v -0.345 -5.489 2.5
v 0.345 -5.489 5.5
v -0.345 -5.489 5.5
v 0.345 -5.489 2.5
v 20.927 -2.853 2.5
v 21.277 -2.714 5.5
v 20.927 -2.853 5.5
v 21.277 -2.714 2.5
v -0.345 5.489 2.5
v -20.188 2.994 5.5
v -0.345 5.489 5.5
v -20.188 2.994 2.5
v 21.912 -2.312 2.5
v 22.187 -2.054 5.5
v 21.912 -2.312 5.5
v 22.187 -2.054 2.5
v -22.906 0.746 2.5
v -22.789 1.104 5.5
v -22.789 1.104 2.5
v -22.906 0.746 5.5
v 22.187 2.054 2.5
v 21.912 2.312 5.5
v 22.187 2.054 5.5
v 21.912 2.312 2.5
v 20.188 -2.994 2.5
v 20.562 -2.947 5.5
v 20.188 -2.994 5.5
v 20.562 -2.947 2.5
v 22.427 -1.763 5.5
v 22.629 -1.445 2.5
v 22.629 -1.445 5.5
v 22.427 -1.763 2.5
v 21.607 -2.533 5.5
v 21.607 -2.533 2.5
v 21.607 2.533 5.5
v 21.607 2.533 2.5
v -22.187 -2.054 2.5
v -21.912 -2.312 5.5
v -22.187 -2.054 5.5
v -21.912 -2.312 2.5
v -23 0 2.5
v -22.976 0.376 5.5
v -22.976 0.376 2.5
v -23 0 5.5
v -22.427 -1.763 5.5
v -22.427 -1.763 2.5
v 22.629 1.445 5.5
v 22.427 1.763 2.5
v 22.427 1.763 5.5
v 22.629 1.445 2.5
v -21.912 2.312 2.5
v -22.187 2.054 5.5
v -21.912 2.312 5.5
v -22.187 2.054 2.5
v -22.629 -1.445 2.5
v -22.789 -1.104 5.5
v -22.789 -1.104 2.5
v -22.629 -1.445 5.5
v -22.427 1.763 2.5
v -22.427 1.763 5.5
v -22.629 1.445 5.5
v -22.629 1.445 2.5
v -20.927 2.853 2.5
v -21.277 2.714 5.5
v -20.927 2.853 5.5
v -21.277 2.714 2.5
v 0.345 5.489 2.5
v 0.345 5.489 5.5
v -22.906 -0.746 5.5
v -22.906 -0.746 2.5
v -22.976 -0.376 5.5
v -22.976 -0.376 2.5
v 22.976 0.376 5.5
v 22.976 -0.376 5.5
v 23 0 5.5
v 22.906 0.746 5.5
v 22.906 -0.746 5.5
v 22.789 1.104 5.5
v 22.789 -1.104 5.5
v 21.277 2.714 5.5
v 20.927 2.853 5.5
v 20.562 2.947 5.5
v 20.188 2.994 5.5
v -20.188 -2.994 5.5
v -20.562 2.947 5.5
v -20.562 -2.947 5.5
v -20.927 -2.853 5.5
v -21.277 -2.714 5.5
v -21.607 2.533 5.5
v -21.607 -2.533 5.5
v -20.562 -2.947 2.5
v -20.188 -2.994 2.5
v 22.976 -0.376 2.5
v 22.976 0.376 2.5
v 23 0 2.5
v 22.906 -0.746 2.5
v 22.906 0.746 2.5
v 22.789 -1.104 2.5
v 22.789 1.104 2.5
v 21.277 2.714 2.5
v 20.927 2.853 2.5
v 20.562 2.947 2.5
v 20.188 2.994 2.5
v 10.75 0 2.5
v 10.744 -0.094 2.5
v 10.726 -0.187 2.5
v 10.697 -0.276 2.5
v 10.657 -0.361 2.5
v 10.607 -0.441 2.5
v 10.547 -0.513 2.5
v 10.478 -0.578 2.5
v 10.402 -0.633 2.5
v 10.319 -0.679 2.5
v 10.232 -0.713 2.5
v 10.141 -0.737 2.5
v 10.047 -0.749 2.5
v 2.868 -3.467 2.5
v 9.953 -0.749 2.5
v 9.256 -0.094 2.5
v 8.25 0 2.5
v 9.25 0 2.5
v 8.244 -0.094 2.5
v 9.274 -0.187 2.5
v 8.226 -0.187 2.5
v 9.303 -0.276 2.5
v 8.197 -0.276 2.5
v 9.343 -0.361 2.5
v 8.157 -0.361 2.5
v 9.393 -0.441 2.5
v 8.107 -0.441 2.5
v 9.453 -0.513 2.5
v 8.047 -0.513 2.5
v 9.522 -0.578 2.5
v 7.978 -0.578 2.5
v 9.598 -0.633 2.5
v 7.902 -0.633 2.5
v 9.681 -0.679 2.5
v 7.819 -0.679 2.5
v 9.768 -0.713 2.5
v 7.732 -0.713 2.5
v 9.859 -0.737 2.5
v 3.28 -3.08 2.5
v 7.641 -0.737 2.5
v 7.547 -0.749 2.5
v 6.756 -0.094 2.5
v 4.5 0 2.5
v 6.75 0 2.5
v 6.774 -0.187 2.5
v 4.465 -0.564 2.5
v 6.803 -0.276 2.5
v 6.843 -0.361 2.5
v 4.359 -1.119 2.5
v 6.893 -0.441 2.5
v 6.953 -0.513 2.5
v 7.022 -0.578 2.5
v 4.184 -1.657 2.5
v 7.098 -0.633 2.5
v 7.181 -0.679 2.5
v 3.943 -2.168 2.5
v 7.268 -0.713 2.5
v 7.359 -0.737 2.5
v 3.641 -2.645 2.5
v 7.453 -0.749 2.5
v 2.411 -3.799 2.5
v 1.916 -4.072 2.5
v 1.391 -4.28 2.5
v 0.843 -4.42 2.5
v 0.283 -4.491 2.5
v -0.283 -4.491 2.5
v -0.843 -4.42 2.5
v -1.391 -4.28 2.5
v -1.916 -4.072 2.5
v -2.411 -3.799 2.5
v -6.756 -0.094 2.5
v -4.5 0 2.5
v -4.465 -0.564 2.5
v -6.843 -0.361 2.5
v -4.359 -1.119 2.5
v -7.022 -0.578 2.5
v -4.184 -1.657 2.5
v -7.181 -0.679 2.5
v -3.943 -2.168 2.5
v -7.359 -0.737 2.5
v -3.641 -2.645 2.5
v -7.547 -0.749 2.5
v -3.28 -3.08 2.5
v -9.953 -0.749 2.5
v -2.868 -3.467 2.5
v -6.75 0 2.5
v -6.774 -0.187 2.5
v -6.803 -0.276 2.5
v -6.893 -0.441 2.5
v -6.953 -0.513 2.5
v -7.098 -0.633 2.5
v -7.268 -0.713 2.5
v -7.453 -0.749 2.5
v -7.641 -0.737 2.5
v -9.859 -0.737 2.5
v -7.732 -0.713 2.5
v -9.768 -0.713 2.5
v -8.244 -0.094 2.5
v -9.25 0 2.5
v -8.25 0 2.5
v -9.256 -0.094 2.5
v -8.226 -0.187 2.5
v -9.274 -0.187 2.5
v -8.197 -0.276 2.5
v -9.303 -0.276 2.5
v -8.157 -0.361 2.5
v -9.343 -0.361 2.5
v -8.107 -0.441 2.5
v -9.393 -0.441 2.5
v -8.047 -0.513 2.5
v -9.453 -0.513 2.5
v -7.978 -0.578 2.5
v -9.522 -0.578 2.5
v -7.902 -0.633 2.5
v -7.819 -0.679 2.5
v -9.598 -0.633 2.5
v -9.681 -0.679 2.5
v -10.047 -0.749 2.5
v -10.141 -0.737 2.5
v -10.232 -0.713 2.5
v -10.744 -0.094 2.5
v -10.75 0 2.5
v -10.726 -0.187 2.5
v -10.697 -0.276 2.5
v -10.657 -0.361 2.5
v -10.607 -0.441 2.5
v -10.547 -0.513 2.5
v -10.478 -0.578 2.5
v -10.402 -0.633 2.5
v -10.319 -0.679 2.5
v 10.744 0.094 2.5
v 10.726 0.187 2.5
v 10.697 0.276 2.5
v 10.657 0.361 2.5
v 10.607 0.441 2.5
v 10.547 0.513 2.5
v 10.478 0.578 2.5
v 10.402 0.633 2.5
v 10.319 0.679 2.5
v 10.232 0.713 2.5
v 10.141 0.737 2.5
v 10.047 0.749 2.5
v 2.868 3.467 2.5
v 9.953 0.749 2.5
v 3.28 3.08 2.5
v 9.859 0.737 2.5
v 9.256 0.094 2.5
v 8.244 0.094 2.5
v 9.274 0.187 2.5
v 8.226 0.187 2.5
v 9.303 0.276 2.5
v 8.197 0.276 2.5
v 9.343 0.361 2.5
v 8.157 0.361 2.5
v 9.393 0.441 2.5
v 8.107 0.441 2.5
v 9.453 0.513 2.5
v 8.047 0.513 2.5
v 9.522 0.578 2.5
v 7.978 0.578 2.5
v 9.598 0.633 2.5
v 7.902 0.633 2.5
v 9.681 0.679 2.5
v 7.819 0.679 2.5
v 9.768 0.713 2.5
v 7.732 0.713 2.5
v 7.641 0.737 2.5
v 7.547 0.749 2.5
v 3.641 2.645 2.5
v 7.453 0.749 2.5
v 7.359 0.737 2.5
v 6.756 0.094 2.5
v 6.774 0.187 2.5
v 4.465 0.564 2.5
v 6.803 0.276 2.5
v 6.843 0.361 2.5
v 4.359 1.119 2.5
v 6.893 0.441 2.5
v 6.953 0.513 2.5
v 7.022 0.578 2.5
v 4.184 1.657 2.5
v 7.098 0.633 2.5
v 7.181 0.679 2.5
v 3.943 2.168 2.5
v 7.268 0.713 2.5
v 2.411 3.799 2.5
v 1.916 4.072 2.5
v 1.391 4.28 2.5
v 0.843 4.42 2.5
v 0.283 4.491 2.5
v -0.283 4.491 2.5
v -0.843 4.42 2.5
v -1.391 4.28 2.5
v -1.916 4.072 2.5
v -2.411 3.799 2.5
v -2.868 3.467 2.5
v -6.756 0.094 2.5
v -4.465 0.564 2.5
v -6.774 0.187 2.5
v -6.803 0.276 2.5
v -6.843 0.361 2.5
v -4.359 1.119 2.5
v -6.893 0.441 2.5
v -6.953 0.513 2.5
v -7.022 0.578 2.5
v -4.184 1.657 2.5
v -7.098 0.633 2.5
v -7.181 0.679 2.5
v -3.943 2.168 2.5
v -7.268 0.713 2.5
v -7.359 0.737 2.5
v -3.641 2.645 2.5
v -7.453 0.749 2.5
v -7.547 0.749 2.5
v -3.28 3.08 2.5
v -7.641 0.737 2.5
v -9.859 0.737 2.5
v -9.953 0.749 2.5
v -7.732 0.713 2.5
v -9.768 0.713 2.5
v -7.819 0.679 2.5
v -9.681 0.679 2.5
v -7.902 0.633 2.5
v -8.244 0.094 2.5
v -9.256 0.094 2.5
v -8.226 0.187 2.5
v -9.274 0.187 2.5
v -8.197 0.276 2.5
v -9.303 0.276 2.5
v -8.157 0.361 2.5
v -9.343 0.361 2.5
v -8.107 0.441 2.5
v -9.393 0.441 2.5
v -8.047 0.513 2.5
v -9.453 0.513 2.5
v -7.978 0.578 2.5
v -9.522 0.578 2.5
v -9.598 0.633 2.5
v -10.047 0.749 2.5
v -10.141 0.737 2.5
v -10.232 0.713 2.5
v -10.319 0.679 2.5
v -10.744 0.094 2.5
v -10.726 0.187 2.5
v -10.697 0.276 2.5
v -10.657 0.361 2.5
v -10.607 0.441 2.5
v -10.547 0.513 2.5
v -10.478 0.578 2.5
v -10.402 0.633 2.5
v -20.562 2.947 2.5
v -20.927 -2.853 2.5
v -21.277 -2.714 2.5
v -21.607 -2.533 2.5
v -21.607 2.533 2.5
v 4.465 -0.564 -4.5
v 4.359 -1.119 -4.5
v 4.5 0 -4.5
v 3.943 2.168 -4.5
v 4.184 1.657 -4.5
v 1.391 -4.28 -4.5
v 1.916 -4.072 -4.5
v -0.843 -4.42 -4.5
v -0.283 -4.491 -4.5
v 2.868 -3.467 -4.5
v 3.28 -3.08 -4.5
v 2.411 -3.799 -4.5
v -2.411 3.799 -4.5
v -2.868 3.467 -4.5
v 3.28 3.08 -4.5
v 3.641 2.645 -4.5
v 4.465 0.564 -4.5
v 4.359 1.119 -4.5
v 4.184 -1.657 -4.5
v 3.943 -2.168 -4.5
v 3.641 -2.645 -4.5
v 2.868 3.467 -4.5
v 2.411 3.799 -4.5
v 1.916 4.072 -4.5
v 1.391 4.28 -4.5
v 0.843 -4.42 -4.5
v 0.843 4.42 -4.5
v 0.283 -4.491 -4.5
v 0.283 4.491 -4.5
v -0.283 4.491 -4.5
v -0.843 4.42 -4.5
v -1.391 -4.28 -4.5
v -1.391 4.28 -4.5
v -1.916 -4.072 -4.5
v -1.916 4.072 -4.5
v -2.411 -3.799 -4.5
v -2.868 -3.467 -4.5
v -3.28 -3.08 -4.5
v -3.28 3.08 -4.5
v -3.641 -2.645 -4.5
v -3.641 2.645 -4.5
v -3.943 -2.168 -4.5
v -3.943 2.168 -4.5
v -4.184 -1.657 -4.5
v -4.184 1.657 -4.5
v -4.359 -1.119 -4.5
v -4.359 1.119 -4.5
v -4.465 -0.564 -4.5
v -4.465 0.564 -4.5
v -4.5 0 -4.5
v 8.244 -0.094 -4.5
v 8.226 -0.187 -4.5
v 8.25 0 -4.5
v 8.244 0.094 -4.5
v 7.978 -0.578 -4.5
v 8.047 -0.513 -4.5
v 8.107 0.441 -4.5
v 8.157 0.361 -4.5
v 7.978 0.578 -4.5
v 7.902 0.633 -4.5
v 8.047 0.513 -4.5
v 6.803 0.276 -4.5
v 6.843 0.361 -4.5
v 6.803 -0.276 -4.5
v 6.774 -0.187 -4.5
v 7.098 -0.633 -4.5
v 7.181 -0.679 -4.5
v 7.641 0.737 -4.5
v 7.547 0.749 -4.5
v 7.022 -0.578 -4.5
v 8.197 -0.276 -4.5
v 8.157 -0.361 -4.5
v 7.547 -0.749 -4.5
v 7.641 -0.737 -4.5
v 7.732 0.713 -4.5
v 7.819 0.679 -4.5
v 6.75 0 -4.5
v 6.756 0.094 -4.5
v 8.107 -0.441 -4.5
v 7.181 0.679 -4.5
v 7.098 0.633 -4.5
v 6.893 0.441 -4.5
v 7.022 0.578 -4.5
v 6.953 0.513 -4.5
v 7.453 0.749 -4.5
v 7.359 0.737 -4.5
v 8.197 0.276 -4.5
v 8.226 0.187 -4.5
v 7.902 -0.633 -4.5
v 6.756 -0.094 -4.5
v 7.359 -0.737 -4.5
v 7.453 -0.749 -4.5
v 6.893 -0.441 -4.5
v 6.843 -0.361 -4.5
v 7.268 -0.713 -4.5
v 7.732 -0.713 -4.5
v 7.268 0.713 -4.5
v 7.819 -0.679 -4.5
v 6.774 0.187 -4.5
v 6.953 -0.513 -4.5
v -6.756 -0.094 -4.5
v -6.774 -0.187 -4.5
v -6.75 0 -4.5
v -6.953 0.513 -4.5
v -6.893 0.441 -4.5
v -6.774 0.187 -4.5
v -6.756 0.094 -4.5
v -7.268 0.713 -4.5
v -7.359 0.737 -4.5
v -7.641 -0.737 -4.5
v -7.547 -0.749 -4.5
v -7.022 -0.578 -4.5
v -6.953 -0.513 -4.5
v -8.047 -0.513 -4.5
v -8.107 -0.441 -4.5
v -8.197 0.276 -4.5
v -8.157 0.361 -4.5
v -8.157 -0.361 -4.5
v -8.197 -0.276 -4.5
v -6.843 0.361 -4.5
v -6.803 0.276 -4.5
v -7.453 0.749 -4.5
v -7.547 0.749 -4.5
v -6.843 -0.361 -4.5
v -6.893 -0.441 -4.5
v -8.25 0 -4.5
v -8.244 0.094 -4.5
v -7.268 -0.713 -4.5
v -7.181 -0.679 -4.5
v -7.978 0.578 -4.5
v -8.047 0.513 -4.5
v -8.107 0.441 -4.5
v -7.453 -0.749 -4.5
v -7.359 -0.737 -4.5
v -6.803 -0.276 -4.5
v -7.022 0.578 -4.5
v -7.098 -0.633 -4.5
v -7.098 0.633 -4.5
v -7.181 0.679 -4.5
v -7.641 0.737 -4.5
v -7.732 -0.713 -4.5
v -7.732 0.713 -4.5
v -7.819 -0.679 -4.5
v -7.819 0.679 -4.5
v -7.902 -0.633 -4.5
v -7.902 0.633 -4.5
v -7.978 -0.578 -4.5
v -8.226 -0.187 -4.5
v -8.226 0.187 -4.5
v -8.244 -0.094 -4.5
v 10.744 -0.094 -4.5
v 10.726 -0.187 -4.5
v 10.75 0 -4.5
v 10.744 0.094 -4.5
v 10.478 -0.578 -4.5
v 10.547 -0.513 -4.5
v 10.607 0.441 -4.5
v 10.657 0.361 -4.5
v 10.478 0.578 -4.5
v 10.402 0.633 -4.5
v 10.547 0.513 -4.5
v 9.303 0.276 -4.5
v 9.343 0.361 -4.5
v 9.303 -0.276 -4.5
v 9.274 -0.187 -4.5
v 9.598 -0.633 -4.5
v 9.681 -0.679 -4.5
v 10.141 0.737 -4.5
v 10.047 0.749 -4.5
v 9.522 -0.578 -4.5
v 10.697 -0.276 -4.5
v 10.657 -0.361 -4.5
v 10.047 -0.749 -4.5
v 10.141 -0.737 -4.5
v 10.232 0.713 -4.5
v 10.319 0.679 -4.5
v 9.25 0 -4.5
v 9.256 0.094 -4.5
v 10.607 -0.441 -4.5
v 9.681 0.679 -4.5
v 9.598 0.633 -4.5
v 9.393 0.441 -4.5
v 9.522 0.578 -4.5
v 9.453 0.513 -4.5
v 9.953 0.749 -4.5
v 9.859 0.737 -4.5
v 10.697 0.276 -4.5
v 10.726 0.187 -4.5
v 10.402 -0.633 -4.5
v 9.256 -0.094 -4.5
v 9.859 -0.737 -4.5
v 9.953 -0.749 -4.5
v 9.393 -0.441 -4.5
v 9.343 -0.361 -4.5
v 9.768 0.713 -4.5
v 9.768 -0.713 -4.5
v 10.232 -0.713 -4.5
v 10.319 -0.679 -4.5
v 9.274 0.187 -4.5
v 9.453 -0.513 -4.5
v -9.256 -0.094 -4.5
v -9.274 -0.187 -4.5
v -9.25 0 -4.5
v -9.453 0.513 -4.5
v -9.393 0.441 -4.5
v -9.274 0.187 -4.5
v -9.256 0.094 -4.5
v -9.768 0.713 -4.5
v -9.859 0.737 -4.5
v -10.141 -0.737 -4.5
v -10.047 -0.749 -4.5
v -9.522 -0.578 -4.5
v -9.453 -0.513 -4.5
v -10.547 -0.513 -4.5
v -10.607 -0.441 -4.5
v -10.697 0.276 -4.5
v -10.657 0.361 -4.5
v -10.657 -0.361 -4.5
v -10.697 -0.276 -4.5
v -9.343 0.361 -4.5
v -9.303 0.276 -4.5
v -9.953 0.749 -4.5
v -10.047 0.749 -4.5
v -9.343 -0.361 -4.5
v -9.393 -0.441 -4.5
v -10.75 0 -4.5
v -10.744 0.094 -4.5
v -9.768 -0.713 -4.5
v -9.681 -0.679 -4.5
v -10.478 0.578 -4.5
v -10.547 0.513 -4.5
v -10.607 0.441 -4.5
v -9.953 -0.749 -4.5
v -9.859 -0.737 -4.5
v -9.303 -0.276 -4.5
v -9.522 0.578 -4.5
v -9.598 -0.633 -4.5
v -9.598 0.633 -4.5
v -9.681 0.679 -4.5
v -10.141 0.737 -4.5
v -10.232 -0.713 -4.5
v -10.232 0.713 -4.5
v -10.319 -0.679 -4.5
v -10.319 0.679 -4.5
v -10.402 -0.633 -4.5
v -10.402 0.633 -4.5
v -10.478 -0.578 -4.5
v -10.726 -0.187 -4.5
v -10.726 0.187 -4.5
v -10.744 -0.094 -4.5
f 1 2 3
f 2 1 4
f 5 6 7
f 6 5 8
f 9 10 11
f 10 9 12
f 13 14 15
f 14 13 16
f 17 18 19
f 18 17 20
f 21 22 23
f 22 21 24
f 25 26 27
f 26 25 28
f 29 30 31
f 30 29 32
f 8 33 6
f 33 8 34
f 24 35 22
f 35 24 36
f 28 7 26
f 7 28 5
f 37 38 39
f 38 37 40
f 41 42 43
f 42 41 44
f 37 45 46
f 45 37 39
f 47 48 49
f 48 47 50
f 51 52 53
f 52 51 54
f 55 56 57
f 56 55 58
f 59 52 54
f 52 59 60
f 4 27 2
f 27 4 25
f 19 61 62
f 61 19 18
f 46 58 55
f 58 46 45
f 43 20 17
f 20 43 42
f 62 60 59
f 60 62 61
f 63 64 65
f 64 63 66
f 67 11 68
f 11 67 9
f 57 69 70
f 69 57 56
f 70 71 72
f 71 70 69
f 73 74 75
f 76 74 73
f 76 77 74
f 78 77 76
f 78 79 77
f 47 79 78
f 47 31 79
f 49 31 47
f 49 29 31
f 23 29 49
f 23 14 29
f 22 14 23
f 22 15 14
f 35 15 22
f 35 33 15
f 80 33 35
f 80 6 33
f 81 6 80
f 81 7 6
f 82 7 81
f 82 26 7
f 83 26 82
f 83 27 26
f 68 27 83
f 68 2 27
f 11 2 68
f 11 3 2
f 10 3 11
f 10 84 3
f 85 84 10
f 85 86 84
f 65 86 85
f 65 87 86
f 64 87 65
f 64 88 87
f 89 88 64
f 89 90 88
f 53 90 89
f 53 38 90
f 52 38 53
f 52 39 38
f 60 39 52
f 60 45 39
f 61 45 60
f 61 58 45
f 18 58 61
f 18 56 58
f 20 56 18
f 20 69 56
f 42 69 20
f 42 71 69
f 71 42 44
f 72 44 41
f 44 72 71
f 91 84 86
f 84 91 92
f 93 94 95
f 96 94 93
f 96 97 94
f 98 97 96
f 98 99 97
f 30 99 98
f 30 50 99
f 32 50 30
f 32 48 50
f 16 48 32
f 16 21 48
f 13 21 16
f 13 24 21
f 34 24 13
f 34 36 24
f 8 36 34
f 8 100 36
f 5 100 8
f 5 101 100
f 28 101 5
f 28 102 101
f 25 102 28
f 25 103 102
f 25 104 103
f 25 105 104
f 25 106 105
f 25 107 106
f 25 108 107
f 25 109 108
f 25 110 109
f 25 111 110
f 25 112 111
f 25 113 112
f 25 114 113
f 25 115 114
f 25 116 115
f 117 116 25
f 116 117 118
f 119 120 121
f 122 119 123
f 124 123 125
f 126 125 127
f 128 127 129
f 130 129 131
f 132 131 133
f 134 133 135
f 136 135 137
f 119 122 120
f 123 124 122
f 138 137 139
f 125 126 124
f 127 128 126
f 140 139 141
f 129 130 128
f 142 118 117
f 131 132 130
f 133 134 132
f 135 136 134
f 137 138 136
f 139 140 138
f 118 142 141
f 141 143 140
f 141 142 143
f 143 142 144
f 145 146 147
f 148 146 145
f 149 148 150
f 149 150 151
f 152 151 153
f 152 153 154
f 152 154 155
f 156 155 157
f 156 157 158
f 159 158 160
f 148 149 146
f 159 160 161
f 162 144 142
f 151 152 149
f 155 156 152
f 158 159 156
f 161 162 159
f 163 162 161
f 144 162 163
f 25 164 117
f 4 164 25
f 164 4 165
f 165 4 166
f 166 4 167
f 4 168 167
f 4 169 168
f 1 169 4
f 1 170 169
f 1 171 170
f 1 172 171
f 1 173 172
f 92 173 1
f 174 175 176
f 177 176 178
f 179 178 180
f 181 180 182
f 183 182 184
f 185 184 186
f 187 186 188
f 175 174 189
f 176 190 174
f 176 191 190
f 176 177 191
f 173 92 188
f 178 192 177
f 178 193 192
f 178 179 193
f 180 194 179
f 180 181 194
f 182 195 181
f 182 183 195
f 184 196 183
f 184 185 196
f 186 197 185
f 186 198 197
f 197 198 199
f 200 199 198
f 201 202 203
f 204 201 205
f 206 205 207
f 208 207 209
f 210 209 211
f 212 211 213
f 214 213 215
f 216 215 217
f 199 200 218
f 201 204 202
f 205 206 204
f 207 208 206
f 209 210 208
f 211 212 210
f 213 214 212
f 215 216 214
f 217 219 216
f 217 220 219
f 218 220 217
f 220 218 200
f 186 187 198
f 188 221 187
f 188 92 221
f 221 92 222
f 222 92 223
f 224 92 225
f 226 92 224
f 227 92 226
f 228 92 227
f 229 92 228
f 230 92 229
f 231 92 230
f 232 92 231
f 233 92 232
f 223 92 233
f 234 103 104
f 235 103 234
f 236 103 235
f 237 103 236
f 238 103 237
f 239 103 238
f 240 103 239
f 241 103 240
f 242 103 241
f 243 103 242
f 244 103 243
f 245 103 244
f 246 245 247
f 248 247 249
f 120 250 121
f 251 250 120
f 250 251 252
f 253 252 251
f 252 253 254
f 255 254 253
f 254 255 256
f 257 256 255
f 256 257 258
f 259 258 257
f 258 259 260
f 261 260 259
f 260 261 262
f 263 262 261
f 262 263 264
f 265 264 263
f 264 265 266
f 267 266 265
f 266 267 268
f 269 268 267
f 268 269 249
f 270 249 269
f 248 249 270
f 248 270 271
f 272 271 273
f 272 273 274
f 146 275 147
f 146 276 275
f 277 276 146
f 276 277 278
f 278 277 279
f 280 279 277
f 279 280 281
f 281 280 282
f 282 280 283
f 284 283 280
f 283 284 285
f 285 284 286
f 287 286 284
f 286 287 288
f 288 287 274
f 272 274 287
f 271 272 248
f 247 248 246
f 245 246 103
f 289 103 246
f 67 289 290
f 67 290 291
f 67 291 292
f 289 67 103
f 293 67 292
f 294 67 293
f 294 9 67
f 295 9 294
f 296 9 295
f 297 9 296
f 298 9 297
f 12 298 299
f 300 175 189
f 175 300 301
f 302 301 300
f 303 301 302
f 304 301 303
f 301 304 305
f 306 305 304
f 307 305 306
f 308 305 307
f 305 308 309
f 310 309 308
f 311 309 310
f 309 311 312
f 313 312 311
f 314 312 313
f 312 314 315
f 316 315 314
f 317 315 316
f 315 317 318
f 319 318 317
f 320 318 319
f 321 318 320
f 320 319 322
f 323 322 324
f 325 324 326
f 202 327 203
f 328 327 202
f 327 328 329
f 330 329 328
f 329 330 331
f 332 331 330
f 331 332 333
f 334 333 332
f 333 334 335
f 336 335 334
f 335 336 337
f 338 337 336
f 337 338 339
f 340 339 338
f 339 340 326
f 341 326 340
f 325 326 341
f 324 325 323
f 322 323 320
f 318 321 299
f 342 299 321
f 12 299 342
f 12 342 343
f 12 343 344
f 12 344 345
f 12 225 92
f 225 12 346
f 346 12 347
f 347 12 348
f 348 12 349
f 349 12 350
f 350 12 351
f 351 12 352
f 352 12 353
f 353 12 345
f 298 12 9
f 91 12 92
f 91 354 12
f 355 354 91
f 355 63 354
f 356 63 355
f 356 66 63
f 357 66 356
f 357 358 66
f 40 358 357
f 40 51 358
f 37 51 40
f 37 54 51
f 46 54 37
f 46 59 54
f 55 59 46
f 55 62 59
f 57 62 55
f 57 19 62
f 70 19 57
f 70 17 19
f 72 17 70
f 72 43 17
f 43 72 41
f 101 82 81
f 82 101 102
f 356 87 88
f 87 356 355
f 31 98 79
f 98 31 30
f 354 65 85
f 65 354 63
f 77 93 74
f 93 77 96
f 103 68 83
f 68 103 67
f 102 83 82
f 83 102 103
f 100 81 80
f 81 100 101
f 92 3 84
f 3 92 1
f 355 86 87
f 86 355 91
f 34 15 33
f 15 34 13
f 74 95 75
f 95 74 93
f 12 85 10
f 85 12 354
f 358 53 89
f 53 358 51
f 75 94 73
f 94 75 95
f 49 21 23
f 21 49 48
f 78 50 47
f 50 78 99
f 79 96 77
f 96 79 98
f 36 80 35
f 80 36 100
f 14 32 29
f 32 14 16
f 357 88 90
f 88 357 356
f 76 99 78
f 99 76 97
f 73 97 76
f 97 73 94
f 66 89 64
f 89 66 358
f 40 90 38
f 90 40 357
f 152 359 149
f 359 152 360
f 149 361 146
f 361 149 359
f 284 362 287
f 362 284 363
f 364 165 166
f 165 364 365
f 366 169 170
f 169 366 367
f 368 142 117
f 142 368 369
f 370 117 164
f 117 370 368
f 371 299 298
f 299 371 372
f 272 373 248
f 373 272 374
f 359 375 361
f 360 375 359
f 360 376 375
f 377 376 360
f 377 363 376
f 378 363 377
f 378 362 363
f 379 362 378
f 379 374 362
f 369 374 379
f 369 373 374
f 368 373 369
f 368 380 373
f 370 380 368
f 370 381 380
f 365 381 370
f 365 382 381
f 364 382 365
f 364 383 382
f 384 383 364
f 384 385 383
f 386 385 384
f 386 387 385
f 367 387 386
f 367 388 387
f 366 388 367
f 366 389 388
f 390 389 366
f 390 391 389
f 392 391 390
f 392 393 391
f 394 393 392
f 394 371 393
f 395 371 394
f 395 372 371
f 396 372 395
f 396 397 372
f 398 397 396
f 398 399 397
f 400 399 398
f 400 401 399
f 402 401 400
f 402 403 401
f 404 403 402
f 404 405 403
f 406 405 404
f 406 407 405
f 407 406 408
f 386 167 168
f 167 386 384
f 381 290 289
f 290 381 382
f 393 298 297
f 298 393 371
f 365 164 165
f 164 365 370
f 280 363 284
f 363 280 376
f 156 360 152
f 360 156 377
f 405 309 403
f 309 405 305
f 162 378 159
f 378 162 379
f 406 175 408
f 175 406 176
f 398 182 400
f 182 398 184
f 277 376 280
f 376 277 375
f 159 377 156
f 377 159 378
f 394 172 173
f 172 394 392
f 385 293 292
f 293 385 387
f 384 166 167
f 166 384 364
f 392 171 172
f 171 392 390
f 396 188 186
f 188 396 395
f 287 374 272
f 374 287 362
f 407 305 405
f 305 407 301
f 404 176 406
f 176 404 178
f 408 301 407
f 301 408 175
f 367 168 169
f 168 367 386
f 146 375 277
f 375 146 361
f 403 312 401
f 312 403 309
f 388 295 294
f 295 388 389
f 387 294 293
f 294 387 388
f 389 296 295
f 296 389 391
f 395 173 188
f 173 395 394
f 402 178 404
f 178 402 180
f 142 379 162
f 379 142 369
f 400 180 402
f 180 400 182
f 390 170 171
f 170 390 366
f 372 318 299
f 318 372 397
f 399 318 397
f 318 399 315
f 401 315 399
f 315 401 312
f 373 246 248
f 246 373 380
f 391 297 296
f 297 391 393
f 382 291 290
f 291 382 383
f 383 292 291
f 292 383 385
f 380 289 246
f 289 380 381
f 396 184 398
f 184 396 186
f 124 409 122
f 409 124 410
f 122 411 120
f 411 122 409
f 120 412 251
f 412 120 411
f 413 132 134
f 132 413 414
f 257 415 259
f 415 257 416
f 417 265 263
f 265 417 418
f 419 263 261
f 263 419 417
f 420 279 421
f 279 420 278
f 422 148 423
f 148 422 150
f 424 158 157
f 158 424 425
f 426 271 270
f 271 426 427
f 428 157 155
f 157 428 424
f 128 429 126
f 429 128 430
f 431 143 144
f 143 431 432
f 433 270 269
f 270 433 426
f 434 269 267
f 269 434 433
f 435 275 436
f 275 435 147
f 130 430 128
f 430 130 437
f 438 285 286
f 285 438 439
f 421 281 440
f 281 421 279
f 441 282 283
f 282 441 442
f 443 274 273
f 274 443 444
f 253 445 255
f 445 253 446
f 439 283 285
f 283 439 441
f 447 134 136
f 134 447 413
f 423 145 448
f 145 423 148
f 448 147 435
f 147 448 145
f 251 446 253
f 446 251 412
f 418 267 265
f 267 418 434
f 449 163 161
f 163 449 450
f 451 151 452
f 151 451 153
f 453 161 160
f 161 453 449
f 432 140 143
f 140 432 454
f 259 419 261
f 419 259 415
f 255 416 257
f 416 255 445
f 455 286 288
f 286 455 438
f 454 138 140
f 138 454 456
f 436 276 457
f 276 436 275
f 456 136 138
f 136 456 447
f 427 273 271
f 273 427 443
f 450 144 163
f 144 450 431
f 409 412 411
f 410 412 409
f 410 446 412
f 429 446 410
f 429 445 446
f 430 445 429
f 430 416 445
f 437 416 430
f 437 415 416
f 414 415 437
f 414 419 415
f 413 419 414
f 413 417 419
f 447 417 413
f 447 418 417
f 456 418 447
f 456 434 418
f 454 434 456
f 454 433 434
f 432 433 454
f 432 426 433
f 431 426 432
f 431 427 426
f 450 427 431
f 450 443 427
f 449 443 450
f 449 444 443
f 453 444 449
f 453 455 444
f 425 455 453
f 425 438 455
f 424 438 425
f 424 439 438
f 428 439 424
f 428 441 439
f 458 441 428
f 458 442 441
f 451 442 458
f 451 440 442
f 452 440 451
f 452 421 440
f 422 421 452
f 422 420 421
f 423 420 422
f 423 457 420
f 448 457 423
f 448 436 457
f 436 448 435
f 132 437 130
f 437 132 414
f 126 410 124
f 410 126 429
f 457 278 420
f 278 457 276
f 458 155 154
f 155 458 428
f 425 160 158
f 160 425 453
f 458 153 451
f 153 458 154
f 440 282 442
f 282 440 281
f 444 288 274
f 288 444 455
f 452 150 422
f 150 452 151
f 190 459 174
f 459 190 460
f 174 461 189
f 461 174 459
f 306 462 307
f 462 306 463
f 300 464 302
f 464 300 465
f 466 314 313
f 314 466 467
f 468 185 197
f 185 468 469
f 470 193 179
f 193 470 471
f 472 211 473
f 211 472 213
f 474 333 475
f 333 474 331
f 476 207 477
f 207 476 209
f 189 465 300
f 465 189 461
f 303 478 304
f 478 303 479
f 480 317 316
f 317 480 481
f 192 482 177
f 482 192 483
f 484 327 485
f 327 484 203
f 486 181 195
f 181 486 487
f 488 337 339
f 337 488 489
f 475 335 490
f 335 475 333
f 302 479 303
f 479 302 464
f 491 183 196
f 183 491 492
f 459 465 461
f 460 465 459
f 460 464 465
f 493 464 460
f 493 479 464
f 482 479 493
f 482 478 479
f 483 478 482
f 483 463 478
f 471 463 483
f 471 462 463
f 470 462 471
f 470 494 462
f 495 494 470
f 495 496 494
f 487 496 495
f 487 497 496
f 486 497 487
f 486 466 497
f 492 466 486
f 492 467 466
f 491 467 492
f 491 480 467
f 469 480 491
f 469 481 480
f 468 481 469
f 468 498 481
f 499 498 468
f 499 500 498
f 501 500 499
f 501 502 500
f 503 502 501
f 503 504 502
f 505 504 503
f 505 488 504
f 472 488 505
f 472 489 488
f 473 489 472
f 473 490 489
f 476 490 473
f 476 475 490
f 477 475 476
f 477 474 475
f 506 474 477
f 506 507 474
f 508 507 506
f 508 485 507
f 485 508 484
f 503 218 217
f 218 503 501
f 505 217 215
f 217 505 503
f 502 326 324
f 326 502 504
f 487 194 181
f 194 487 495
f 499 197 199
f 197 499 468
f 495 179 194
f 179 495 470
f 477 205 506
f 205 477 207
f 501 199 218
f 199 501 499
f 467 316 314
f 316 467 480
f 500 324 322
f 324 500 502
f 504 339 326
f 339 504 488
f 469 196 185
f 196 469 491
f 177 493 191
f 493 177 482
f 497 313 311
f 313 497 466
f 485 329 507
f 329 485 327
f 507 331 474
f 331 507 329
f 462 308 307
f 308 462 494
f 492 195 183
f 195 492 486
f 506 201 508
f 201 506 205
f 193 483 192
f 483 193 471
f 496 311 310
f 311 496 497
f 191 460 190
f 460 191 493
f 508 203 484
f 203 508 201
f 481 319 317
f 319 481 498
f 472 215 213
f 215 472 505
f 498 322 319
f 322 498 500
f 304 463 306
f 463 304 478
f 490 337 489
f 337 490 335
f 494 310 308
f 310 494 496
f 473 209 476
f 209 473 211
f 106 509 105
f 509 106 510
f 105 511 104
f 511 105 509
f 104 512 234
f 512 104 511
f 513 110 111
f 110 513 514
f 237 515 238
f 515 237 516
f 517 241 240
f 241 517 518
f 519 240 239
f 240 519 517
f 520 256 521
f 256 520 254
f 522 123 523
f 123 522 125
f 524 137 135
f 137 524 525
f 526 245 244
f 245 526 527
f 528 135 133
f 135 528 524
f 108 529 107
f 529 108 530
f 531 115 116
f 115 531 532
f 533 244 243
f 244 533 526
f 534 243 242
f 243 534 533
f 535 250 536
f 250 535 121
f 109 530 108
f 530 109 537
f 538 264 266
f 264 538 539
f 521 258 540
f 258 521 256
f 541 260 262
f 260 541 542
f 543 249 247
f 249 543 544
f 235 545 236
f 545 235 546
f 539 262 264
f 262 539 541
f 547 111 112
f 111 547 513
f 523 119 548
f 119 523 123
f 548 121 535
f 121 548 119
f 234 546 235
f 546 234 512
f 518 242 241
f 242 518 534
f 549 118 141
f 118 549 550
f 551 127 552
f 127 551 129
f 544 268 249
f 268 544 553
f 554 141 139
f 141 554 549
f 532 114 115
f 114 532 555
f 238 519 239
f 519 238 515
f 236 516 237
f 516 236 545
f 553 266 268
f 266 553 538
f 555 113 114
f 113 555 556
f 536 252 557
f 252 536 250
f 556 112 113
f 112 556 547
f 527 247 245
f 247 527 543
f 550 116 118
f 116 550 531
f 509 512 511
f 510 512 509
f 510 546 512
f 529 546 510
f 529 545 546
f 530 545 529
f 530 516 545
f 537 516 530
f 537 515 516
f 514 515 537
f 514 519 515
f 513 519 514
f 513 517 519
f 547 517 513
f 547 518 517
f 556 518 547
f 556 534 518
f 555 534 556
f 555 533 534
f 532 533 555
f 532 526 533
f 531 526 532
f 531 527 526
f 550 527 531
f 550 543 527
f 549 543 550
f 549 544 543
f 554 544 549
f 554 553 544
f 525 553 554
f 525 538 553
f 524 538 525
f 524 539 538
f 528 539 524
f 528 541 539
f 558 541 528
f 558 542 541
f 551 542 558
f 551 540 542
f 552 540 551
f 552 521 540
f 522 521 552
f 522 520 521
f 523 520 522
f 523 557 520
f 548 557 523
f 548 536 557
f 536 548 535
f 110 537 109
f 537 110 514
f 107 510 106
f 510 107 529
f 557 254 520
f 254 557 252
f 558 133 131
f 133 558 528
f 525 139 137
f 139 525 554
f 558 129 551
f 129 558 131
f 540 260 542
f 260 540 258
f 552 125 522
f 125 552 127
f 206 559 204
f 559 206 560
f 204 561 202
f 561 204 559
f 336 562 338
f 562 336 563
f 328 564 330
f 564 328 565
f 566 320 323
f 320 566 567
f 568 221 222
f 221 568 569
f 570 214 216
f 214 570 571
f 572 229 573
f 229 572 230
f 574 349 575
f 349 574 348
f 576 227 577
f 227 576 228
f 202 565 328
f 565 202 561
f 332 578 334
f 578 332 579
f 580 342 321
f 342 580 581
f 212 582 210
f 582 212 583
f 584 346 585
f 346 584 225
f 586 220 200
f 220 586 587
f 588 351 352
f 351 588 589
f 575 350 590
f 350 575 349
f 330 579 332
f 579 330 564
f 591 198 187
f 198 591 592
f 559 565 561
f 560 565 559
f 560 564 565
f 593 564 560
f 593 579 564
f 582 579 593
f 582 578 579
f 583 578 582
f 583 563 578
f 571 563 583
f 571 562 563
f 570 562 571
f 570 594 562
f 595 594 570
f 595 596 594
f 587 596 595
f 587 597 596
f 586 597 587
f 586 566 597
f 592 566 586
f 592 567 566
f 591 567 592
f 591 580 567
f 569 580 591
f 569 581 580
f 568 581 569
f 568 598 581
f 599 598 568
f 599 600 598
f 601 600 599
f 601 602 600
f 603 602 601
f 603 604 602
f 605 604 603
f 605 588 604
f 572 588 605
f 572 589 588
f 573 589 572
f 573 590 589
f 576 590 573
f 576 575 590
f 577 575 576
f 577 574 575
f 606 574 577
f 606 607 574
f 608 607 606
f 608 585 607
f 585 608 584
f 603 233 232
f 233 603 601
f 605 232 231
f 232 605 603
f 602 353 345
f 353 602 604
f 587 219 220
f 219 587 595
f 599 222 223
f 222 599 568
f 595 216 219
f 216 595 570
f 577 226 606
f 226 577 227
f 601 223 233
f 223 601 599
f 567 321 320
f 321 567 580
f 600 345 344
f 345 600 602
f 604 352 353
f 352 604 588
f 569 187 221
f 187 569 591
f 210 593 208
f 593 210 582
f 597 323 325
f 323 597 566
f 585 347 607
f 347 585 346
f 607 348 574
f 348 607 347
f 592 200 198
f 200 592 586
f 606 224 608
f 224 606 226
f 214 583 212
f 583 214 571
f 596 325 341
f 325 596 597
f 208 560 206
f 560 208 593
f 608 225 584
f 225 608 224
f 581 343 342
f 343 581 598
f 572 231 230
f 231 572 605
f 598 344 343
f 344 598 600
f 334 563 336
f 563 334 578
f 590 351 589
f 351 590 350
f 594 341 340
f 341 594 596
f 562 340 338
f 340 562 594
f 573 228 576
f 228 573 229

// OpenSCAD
module brazo(){
	hull(){
	
	cylinder(r = 11/2, h = 3, $fn = 50);
	translate([20, 0, 0])
    cylinder(r = 6/2, h = 3,  $fn = 50);
	translate([-20, 0, 0])
    cylinder(r = 6/2, h = 3,  $fn = 50);

	}

	cylinder(r = 9/2, h = 10,  $fn = 50);
}

module agujeros(){

	translate([7.5, 0, 0])
   cylinder(r = 1.5/2, h = 10,  $fn = 50);
	translate([-7.5, 0, 0])
   cylinder(r = 1.5/2, h = 10,  $fn = 50);
	translate([10, 0, 0])
   cylinder(r = 1.5/2, h = 10,  $fn = 50);
	translate([-10, 0, 0])
   cylinder(r = 1.5/2, h = 10,  $fn = 50);


}

module horn(){
	brazo();
	agujeros();

}

difference(){
//import_stl("pan_tilt.stl", convexity = 5);

translate([0, 0,5.5])
rotate([180,0,0])
horn();
}
